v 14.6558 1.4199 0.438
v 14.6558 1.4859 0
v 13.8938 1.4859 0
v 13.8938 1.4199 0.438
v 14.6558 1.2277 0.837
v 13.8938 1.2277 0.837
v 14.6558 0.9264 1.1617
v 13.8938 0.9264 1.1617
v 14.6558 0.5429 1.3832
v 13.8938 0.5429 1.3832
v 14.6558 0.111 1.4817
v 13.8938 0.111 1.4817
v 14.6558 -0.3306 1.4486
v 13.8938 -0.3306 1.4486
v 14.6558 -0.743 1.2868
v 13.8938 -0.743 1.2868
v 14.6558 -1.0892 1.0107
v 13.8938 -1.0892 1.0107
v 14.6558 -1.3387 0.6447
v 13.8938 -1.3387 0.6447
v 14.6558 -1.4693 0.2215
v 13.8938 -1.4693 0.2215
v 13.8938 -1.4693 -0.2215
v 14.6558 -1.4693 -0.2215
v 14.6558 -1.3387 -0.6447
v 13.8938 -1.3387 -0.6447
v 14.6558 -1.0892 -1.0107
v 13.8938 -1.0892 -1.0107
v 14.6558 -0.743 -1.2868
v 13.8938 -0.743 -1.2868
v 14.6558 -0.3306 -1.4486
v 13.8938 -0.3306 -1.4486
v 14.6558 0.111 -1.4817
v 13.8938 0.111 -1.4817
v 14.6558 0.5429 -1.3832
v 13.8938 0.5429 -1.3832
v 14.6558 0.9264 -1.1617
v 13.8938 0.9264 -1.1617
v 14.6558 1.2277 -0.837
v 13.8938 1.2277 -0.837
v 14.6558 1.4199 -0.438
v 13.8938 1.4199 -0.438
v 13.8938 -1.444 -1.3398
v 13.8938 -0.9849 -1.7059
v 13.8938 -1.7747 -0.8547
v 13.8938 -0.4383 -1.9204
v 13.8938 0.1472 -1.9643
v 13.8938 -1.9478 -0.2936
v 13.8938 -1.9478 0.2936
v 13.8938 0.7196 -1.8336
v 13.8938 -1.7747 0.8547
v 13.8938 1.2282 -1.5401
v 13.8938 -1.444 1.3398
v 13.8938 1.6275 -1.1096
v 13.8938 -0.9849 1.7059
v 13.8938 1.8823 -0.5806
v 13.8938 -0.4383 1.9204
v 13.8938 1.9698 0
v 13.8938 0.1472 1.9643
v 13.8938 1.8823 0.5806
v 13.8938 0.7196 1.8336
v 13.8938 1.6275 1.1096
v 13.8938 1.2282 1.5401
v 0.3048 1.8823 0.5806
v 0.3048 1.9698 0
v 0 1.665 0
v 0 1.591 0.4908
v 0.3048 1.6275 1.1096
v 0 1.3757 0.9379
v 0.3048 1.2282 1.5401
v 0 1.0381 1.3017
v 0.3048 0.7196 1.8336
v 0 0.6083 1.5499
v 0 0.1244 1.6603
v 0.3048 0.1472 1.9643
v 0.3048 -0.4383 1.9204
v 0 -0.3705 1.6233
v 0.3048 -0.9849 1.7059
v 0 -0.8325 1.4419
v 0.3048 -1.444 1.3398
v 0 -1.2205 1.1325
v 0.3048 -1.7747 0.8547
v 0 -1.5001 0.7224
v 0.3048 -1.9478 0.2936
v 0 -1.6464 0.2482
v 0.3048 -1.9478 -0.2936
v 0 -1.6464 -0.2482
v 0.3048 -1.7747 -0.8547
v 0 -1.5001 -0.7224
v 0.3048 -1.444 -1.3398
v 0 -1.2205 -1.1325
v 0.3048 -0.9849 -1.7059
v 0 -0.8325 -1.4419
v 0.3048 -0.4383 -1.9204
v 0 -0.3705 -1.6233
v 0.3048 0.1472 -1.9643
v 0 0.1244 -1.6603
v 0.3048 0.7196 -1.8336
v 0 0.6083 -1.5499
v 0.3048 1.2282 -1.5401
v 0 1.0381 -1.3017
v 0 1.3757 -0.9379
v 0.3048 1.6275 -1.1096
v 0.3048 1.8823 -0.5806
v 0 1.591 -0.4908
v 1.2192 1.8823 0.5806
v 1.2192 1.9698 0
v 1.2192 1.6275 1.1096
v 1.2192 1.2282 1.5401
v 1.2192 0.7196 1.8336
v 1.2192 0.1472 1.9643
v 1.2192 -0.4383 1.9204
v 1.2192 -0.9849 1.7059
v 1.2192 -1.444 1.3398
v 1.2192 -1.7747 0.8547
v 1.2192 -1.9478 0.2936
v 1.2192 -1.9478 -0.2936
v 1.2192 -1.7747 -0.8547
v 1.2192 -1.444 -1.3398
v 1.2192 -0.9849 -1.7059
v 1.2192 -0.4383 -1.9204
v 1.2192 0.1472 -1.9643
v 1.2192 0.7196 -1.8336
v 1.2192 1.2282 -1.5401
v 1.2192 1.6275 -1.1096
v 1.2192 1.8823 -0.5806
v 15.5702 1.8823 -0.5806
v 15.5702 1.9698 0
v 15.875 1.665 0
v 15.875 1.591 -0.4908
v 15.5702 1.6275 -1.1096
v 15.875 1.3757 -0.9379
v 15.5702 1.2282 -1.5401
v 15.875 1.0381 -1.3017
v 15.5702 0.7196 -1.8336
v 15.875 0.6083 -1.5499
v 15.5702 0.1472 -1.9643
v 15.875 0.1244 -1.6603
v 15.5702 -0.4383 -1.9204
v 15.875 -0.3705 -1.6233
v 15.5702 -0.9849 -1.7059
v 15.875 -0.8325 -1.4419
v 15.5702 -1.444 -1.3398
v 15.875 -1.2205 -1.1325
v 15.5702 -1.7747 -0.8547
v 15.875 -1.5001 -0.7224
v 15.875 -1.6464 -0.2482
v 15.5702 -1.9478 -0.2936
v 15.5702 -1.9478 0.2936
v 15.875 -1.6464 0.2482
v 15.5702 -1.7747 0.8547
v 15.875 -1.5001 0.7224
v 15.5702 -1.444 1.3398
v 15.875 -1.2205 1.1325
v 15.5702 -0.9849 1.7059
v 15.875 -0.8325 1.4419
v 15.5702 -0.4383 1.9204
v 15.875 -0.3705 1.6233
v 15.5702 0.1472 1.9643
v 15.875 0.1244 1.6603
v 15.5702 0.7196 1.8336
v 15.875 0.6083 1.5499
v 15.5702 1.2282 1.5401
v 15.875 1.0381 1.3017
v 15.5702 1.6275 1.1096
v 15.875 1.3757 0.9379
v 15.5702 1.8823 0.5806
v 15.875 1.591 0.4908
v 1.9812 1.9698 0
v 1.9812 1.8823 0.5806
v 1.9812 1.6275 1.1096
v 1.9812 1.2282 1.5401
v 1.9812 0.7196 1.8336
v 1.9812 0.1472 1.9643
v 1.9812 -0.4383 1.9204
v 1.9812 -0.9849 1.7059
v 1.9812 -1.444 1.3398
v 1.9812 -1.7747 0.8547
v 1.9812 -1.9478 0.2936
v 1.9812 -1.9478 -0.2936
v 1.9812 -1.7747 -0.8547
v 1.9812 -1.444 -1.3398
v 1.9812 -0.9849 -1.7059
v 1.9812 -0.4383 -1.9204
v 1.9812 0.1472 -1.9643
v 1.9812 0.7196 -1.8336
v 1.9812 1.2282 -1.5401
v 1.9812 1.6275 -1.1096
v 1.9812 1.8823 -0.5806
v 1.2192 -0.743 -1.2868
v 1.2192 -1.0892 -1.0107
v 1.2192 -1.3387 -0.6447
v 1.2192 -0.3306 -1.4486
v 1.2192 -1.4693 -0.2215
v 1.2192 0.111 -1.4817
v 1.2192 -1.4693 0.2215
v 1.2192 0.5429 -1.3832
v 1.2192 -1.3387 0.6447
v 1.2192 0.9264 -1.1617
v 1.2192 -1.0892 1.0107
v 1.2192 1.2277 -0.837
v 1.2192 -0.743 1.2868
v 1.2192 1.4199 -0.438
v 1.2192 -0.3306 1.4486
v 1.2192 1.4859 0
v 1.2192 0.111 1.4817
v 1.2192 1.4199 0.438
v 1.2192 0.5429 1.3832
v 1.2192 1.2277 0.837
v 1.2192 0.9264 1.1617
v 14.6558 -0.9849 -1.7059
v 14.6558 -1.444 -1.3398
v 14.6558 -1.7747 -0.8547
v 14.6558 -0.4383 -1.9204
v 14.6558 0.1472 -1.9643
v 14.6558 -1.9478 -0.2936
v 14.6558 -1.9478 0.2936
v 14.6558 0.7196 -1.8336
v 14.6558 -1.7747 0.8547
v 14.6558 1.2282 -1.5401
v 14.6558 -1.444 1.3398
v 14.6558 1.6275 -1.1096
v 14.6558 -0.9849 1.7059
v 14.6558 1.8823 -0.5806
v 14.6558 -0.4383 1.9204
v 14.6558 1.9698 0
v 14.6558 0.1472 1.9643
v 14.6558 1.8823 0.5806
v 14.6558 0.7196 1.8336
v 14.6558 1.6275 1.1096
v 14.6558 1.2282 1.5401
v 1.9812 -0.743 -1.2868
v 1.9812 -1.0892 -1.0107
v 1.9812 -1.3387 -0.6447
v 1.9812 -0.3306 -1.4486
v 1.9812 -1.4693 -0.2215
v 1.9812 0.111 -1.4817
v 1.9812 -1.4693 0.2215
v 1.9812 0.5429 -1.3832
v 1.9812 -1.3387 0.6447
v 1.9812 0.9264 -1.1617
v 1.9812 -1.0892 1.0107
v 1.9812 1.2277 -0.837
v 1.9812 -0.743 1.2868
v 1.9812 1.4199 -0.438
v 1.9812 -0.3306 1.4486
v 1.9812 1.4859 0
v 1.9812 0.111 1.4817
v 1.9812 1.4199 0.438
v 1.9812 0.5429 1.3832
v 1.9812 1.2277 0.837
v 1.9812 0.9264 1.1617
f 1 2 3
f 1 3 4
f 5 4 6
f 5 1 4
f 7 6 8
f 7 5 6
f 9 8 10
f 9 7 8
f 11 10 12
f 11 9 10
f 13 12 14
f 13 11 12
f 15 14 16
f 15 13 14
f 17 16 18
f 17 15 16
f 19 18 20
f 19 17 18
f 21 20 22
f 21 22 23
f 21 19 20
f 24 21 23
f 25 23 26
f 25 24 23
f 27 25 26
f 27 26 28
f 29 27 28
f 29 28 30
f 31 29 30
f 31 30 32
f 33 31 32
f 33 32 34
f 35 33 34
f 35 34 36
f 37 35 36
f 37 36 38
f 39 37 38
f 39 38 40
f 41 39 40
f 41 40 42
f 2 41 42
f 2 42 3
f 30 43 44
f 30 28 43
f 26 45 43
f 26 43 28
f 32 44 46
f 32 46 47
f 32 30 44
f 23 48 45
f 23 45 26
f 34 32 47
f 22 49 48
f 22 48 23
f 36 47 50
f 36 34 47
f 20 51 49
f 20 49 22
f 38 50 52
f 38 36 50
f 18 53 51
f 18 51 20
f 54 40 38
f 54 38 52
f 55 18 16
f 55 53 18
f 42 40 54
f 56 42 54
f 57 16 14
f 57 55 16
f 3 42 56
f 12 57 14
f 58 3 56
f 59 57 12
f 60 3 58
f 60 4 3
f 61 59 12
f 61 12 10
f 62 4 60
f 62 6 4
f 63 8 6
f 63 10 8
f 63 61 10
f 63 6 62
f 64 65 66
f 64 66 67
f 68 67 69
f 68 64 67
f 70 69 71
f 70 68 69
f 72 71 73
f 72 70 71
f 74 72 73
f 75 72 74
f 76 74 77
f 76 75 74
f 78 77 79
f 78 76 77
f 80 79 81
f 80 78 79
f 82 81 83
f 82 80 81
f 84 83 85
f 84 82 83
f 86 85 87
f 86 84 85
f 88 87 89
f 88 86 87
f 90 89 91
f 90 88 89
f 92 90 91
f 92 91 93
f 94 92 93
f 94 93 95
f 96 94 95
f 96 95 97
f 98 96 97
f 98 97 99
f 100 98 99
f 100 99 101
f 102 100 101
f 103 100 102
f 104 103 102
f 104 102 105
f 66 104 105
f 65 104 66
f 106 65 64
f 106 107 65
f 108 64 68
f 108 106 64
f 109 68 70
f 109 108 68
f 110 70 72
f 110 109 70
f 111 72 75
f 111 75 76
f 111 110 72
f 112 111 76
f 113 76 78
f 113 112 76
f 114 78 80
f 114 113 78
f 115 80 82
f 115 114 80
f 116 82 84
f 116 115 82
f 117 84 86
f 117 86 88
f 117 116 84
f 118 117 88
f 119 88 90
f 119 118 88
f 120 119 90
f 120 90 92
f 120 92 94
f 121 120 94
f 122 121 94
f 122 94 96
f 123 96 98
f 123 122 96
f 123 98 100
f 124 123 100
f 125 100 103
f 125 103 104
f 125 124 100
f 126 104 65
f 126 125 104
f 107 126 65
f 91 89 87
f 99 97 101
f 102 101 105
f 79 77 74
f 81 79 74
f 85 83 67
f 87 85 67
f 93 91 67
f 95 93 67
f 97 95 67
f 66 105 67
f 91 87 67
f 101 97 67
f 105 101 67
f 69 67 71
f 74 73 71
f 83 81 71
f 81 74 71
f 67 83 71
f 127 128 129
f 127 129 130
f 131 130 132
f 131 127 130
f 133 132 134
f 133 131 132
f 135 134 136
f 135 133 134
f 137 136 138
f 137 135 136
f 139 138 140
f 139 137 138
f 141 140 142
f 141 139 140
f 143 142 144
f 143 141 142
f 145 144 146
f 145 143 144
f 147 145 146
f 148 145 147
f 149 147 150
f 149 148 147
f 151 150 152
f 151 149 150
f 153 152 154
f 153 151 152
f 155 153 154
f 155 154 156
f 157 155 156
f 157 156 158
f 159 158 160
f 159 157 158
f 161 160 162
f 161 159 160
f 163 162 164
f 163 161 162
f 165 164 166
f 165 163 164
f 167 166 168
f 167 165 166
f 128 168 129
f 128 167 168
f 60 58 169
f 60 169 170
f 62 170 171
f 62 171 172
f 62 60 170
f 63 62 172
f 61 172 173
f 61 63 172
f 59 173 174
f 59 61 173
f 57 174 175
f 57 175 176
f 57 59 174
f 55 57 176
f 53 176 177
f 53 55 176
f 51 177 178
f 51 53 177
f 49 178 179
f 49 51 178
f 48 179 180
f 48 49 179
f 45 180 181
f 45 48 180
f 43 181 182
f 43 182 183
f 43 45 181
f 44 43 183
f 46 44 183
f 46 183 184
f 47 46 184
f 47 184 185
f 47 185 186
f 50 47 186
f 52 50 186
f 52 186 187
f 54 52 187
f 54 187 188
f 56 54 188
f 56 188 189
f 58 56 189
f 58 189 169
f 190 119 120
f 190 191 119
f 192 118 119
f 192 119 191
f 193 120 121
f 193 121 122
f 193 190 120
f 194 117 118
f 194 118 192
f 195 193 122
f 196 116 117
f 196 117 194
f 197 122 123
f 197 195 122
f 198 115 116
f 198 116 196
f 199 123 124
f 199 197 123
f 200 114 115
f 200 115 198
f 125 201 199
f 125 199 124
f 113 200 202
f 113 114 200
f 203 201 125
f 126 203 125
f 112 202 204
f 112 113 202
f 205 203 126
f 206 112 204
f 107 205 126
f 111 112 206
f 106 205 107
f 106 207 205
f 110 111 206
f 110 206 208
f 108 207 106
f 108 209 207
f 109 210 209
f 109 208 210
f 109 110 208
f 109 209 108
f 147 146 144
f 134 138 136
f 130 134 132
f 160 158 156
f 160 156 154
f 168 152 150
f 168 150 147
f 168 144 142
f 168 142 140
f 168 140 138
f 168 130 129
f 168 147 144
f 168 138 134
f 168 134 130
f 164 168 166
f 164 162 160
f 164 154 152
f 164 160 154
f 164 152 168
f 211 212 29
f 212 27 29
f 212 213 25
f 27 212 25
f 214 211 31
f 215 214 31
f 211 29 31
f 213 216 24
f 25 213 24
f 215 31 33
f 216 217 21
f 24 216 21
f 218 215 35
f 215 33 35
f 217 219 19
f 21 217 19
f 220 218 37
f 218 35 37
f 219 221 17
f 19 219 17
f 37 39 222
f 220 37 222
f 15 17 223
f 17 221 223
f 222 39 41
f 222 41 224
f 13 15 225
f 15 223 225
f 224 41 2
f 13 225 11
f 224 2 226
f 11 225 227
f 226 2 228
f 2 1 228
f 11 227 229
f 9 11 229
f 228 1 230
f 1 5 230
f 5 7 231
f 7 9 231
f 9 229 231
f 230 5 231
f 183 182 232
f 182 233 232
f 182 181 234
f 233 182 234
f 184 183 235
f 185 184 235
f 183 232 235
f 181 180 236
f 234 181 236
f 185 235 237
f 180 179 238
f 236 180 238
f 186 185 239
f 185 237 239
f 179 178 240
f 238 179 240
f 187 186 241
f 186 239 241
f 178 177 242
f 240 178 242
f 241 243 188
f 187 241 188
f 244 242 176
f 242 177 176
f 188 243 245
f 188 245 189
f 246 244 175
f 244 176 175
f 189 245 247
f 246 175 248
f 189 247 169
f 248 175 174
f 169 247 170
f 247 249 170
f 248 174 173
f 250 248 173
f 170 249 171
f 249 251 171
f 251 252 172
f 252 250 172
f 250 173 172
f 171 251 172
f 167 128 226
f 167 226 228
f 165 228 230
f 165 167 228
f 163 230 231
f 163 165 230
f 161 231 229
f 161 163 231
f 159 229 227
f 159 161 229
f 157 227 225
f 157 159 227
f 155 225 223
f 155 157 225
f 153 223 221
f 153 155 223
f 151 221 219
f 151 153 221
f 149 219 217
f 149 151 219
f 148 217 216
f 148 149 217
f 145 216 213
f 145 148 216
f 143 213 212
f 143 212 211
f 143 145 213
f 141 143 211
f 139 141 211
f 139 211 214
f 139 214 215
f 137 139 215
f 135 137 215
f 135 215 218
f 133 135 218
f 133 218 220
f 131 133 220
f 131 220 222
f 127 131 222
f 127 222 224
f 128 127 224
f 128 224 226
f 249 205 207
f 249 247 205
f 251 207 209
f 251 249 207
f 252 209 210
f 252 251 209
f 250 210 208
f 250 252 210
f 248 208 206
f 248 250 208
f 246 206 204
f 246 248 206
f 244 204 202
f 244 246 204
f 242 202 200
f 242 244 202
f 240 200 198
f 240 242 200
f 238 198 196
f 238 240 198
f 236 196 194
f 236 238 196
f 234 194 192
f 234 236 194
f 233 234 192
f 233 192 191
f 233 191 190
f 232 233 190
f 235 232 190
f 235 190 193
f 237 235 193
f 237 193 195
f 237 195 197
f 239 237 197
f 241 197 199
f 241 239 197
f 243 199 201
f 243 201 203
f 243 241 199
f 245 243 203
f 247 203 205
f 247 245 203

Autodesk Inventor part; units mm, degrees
sketch "Sketch_1" plane through (0, 0, 0) normal (0, 0, 1) x (1, 0, 0)
  line L0 (15.875, 0) -> (0, 0)
  line L1 (0, 0) -> (0, 1.665)
  line L2 (0, 1.665) -> (0.3048, 1.9698)
  line L3 (0.3048, 1.9698) -> (1.2192, 1.9698)
  line L4 (1.2192, 1.9698) -> (1.2192, 1.4859)
  line L5 (1.2192, 1.4859) -> (1.9812, 1.4859)
  line L6 (1.9812, 1.4859) -> (1.9812, 1.9698)
  line L7 (1.9812, 1.9698) -> (13.8938, 1.9698)
  line L8 (13.8938, 1.9698) -> (13.8938, 1.4859)
  line L9 (13.8938, 1.4859) -> (14.6558, 1.4859)
  line L10 (14.6558, 1.4859) -> (14.6558, 1.9698)
  line L11 (14.6558, 1.9698) -> (15.5702, 1.9698)
  line L12 (15.5702, 1.9698) -> (15.875, 1.665)
  line L13 (15.875, 1.665) -> (15.875, 0)
  line L14 (15.875, 0) -> (0, 0)
revolve "Revolution1" add sketch "Sketch_1" angle 360 about axis through (15.875, 0, 0) along (1, 0, 0)
ref_plane "pin_XY" through (7.9375, 0, 0) normal (1, 0, 0) x (0, 0, -1)
ref_plane "pin_YZ" through (7.9375, 0, 0) normal (0, 0, -1) x (0, 1, 0)
ref_plane "pin_ZX" through (7.9375, 0, 0) normal (0, 1, 0) x (1, 0, 0)
ref_plane "rr1_XY" through (1.6002, 0, 0) normal (1, 0, 0) x (0, 0, -1)
ref_plane "rr1_YZ" through (1.6002, 0, 0) normal (0, 0, -1) x (0, 1, 0)
ref_plane "rr1_ZX" through (1.6002, 0, 0) normal (0, 1, 0) x (1, 0, 0)
ref_plane "rr2_XY" through (14.2748, 0, 0) normal (1, 0, 0) x (0, 0, -1)
ref_plane "rr2_YZ" through (14.2748, 0, 0) normal (0, 0, -1) x (0, 1, 0)
ref_plane "rr2_ZX" through (14.2748, 0, 0) normal (0, 1, 0) x (1, 0, 0)
properties part number "D-9769-clevis_pin" material "Steel"
